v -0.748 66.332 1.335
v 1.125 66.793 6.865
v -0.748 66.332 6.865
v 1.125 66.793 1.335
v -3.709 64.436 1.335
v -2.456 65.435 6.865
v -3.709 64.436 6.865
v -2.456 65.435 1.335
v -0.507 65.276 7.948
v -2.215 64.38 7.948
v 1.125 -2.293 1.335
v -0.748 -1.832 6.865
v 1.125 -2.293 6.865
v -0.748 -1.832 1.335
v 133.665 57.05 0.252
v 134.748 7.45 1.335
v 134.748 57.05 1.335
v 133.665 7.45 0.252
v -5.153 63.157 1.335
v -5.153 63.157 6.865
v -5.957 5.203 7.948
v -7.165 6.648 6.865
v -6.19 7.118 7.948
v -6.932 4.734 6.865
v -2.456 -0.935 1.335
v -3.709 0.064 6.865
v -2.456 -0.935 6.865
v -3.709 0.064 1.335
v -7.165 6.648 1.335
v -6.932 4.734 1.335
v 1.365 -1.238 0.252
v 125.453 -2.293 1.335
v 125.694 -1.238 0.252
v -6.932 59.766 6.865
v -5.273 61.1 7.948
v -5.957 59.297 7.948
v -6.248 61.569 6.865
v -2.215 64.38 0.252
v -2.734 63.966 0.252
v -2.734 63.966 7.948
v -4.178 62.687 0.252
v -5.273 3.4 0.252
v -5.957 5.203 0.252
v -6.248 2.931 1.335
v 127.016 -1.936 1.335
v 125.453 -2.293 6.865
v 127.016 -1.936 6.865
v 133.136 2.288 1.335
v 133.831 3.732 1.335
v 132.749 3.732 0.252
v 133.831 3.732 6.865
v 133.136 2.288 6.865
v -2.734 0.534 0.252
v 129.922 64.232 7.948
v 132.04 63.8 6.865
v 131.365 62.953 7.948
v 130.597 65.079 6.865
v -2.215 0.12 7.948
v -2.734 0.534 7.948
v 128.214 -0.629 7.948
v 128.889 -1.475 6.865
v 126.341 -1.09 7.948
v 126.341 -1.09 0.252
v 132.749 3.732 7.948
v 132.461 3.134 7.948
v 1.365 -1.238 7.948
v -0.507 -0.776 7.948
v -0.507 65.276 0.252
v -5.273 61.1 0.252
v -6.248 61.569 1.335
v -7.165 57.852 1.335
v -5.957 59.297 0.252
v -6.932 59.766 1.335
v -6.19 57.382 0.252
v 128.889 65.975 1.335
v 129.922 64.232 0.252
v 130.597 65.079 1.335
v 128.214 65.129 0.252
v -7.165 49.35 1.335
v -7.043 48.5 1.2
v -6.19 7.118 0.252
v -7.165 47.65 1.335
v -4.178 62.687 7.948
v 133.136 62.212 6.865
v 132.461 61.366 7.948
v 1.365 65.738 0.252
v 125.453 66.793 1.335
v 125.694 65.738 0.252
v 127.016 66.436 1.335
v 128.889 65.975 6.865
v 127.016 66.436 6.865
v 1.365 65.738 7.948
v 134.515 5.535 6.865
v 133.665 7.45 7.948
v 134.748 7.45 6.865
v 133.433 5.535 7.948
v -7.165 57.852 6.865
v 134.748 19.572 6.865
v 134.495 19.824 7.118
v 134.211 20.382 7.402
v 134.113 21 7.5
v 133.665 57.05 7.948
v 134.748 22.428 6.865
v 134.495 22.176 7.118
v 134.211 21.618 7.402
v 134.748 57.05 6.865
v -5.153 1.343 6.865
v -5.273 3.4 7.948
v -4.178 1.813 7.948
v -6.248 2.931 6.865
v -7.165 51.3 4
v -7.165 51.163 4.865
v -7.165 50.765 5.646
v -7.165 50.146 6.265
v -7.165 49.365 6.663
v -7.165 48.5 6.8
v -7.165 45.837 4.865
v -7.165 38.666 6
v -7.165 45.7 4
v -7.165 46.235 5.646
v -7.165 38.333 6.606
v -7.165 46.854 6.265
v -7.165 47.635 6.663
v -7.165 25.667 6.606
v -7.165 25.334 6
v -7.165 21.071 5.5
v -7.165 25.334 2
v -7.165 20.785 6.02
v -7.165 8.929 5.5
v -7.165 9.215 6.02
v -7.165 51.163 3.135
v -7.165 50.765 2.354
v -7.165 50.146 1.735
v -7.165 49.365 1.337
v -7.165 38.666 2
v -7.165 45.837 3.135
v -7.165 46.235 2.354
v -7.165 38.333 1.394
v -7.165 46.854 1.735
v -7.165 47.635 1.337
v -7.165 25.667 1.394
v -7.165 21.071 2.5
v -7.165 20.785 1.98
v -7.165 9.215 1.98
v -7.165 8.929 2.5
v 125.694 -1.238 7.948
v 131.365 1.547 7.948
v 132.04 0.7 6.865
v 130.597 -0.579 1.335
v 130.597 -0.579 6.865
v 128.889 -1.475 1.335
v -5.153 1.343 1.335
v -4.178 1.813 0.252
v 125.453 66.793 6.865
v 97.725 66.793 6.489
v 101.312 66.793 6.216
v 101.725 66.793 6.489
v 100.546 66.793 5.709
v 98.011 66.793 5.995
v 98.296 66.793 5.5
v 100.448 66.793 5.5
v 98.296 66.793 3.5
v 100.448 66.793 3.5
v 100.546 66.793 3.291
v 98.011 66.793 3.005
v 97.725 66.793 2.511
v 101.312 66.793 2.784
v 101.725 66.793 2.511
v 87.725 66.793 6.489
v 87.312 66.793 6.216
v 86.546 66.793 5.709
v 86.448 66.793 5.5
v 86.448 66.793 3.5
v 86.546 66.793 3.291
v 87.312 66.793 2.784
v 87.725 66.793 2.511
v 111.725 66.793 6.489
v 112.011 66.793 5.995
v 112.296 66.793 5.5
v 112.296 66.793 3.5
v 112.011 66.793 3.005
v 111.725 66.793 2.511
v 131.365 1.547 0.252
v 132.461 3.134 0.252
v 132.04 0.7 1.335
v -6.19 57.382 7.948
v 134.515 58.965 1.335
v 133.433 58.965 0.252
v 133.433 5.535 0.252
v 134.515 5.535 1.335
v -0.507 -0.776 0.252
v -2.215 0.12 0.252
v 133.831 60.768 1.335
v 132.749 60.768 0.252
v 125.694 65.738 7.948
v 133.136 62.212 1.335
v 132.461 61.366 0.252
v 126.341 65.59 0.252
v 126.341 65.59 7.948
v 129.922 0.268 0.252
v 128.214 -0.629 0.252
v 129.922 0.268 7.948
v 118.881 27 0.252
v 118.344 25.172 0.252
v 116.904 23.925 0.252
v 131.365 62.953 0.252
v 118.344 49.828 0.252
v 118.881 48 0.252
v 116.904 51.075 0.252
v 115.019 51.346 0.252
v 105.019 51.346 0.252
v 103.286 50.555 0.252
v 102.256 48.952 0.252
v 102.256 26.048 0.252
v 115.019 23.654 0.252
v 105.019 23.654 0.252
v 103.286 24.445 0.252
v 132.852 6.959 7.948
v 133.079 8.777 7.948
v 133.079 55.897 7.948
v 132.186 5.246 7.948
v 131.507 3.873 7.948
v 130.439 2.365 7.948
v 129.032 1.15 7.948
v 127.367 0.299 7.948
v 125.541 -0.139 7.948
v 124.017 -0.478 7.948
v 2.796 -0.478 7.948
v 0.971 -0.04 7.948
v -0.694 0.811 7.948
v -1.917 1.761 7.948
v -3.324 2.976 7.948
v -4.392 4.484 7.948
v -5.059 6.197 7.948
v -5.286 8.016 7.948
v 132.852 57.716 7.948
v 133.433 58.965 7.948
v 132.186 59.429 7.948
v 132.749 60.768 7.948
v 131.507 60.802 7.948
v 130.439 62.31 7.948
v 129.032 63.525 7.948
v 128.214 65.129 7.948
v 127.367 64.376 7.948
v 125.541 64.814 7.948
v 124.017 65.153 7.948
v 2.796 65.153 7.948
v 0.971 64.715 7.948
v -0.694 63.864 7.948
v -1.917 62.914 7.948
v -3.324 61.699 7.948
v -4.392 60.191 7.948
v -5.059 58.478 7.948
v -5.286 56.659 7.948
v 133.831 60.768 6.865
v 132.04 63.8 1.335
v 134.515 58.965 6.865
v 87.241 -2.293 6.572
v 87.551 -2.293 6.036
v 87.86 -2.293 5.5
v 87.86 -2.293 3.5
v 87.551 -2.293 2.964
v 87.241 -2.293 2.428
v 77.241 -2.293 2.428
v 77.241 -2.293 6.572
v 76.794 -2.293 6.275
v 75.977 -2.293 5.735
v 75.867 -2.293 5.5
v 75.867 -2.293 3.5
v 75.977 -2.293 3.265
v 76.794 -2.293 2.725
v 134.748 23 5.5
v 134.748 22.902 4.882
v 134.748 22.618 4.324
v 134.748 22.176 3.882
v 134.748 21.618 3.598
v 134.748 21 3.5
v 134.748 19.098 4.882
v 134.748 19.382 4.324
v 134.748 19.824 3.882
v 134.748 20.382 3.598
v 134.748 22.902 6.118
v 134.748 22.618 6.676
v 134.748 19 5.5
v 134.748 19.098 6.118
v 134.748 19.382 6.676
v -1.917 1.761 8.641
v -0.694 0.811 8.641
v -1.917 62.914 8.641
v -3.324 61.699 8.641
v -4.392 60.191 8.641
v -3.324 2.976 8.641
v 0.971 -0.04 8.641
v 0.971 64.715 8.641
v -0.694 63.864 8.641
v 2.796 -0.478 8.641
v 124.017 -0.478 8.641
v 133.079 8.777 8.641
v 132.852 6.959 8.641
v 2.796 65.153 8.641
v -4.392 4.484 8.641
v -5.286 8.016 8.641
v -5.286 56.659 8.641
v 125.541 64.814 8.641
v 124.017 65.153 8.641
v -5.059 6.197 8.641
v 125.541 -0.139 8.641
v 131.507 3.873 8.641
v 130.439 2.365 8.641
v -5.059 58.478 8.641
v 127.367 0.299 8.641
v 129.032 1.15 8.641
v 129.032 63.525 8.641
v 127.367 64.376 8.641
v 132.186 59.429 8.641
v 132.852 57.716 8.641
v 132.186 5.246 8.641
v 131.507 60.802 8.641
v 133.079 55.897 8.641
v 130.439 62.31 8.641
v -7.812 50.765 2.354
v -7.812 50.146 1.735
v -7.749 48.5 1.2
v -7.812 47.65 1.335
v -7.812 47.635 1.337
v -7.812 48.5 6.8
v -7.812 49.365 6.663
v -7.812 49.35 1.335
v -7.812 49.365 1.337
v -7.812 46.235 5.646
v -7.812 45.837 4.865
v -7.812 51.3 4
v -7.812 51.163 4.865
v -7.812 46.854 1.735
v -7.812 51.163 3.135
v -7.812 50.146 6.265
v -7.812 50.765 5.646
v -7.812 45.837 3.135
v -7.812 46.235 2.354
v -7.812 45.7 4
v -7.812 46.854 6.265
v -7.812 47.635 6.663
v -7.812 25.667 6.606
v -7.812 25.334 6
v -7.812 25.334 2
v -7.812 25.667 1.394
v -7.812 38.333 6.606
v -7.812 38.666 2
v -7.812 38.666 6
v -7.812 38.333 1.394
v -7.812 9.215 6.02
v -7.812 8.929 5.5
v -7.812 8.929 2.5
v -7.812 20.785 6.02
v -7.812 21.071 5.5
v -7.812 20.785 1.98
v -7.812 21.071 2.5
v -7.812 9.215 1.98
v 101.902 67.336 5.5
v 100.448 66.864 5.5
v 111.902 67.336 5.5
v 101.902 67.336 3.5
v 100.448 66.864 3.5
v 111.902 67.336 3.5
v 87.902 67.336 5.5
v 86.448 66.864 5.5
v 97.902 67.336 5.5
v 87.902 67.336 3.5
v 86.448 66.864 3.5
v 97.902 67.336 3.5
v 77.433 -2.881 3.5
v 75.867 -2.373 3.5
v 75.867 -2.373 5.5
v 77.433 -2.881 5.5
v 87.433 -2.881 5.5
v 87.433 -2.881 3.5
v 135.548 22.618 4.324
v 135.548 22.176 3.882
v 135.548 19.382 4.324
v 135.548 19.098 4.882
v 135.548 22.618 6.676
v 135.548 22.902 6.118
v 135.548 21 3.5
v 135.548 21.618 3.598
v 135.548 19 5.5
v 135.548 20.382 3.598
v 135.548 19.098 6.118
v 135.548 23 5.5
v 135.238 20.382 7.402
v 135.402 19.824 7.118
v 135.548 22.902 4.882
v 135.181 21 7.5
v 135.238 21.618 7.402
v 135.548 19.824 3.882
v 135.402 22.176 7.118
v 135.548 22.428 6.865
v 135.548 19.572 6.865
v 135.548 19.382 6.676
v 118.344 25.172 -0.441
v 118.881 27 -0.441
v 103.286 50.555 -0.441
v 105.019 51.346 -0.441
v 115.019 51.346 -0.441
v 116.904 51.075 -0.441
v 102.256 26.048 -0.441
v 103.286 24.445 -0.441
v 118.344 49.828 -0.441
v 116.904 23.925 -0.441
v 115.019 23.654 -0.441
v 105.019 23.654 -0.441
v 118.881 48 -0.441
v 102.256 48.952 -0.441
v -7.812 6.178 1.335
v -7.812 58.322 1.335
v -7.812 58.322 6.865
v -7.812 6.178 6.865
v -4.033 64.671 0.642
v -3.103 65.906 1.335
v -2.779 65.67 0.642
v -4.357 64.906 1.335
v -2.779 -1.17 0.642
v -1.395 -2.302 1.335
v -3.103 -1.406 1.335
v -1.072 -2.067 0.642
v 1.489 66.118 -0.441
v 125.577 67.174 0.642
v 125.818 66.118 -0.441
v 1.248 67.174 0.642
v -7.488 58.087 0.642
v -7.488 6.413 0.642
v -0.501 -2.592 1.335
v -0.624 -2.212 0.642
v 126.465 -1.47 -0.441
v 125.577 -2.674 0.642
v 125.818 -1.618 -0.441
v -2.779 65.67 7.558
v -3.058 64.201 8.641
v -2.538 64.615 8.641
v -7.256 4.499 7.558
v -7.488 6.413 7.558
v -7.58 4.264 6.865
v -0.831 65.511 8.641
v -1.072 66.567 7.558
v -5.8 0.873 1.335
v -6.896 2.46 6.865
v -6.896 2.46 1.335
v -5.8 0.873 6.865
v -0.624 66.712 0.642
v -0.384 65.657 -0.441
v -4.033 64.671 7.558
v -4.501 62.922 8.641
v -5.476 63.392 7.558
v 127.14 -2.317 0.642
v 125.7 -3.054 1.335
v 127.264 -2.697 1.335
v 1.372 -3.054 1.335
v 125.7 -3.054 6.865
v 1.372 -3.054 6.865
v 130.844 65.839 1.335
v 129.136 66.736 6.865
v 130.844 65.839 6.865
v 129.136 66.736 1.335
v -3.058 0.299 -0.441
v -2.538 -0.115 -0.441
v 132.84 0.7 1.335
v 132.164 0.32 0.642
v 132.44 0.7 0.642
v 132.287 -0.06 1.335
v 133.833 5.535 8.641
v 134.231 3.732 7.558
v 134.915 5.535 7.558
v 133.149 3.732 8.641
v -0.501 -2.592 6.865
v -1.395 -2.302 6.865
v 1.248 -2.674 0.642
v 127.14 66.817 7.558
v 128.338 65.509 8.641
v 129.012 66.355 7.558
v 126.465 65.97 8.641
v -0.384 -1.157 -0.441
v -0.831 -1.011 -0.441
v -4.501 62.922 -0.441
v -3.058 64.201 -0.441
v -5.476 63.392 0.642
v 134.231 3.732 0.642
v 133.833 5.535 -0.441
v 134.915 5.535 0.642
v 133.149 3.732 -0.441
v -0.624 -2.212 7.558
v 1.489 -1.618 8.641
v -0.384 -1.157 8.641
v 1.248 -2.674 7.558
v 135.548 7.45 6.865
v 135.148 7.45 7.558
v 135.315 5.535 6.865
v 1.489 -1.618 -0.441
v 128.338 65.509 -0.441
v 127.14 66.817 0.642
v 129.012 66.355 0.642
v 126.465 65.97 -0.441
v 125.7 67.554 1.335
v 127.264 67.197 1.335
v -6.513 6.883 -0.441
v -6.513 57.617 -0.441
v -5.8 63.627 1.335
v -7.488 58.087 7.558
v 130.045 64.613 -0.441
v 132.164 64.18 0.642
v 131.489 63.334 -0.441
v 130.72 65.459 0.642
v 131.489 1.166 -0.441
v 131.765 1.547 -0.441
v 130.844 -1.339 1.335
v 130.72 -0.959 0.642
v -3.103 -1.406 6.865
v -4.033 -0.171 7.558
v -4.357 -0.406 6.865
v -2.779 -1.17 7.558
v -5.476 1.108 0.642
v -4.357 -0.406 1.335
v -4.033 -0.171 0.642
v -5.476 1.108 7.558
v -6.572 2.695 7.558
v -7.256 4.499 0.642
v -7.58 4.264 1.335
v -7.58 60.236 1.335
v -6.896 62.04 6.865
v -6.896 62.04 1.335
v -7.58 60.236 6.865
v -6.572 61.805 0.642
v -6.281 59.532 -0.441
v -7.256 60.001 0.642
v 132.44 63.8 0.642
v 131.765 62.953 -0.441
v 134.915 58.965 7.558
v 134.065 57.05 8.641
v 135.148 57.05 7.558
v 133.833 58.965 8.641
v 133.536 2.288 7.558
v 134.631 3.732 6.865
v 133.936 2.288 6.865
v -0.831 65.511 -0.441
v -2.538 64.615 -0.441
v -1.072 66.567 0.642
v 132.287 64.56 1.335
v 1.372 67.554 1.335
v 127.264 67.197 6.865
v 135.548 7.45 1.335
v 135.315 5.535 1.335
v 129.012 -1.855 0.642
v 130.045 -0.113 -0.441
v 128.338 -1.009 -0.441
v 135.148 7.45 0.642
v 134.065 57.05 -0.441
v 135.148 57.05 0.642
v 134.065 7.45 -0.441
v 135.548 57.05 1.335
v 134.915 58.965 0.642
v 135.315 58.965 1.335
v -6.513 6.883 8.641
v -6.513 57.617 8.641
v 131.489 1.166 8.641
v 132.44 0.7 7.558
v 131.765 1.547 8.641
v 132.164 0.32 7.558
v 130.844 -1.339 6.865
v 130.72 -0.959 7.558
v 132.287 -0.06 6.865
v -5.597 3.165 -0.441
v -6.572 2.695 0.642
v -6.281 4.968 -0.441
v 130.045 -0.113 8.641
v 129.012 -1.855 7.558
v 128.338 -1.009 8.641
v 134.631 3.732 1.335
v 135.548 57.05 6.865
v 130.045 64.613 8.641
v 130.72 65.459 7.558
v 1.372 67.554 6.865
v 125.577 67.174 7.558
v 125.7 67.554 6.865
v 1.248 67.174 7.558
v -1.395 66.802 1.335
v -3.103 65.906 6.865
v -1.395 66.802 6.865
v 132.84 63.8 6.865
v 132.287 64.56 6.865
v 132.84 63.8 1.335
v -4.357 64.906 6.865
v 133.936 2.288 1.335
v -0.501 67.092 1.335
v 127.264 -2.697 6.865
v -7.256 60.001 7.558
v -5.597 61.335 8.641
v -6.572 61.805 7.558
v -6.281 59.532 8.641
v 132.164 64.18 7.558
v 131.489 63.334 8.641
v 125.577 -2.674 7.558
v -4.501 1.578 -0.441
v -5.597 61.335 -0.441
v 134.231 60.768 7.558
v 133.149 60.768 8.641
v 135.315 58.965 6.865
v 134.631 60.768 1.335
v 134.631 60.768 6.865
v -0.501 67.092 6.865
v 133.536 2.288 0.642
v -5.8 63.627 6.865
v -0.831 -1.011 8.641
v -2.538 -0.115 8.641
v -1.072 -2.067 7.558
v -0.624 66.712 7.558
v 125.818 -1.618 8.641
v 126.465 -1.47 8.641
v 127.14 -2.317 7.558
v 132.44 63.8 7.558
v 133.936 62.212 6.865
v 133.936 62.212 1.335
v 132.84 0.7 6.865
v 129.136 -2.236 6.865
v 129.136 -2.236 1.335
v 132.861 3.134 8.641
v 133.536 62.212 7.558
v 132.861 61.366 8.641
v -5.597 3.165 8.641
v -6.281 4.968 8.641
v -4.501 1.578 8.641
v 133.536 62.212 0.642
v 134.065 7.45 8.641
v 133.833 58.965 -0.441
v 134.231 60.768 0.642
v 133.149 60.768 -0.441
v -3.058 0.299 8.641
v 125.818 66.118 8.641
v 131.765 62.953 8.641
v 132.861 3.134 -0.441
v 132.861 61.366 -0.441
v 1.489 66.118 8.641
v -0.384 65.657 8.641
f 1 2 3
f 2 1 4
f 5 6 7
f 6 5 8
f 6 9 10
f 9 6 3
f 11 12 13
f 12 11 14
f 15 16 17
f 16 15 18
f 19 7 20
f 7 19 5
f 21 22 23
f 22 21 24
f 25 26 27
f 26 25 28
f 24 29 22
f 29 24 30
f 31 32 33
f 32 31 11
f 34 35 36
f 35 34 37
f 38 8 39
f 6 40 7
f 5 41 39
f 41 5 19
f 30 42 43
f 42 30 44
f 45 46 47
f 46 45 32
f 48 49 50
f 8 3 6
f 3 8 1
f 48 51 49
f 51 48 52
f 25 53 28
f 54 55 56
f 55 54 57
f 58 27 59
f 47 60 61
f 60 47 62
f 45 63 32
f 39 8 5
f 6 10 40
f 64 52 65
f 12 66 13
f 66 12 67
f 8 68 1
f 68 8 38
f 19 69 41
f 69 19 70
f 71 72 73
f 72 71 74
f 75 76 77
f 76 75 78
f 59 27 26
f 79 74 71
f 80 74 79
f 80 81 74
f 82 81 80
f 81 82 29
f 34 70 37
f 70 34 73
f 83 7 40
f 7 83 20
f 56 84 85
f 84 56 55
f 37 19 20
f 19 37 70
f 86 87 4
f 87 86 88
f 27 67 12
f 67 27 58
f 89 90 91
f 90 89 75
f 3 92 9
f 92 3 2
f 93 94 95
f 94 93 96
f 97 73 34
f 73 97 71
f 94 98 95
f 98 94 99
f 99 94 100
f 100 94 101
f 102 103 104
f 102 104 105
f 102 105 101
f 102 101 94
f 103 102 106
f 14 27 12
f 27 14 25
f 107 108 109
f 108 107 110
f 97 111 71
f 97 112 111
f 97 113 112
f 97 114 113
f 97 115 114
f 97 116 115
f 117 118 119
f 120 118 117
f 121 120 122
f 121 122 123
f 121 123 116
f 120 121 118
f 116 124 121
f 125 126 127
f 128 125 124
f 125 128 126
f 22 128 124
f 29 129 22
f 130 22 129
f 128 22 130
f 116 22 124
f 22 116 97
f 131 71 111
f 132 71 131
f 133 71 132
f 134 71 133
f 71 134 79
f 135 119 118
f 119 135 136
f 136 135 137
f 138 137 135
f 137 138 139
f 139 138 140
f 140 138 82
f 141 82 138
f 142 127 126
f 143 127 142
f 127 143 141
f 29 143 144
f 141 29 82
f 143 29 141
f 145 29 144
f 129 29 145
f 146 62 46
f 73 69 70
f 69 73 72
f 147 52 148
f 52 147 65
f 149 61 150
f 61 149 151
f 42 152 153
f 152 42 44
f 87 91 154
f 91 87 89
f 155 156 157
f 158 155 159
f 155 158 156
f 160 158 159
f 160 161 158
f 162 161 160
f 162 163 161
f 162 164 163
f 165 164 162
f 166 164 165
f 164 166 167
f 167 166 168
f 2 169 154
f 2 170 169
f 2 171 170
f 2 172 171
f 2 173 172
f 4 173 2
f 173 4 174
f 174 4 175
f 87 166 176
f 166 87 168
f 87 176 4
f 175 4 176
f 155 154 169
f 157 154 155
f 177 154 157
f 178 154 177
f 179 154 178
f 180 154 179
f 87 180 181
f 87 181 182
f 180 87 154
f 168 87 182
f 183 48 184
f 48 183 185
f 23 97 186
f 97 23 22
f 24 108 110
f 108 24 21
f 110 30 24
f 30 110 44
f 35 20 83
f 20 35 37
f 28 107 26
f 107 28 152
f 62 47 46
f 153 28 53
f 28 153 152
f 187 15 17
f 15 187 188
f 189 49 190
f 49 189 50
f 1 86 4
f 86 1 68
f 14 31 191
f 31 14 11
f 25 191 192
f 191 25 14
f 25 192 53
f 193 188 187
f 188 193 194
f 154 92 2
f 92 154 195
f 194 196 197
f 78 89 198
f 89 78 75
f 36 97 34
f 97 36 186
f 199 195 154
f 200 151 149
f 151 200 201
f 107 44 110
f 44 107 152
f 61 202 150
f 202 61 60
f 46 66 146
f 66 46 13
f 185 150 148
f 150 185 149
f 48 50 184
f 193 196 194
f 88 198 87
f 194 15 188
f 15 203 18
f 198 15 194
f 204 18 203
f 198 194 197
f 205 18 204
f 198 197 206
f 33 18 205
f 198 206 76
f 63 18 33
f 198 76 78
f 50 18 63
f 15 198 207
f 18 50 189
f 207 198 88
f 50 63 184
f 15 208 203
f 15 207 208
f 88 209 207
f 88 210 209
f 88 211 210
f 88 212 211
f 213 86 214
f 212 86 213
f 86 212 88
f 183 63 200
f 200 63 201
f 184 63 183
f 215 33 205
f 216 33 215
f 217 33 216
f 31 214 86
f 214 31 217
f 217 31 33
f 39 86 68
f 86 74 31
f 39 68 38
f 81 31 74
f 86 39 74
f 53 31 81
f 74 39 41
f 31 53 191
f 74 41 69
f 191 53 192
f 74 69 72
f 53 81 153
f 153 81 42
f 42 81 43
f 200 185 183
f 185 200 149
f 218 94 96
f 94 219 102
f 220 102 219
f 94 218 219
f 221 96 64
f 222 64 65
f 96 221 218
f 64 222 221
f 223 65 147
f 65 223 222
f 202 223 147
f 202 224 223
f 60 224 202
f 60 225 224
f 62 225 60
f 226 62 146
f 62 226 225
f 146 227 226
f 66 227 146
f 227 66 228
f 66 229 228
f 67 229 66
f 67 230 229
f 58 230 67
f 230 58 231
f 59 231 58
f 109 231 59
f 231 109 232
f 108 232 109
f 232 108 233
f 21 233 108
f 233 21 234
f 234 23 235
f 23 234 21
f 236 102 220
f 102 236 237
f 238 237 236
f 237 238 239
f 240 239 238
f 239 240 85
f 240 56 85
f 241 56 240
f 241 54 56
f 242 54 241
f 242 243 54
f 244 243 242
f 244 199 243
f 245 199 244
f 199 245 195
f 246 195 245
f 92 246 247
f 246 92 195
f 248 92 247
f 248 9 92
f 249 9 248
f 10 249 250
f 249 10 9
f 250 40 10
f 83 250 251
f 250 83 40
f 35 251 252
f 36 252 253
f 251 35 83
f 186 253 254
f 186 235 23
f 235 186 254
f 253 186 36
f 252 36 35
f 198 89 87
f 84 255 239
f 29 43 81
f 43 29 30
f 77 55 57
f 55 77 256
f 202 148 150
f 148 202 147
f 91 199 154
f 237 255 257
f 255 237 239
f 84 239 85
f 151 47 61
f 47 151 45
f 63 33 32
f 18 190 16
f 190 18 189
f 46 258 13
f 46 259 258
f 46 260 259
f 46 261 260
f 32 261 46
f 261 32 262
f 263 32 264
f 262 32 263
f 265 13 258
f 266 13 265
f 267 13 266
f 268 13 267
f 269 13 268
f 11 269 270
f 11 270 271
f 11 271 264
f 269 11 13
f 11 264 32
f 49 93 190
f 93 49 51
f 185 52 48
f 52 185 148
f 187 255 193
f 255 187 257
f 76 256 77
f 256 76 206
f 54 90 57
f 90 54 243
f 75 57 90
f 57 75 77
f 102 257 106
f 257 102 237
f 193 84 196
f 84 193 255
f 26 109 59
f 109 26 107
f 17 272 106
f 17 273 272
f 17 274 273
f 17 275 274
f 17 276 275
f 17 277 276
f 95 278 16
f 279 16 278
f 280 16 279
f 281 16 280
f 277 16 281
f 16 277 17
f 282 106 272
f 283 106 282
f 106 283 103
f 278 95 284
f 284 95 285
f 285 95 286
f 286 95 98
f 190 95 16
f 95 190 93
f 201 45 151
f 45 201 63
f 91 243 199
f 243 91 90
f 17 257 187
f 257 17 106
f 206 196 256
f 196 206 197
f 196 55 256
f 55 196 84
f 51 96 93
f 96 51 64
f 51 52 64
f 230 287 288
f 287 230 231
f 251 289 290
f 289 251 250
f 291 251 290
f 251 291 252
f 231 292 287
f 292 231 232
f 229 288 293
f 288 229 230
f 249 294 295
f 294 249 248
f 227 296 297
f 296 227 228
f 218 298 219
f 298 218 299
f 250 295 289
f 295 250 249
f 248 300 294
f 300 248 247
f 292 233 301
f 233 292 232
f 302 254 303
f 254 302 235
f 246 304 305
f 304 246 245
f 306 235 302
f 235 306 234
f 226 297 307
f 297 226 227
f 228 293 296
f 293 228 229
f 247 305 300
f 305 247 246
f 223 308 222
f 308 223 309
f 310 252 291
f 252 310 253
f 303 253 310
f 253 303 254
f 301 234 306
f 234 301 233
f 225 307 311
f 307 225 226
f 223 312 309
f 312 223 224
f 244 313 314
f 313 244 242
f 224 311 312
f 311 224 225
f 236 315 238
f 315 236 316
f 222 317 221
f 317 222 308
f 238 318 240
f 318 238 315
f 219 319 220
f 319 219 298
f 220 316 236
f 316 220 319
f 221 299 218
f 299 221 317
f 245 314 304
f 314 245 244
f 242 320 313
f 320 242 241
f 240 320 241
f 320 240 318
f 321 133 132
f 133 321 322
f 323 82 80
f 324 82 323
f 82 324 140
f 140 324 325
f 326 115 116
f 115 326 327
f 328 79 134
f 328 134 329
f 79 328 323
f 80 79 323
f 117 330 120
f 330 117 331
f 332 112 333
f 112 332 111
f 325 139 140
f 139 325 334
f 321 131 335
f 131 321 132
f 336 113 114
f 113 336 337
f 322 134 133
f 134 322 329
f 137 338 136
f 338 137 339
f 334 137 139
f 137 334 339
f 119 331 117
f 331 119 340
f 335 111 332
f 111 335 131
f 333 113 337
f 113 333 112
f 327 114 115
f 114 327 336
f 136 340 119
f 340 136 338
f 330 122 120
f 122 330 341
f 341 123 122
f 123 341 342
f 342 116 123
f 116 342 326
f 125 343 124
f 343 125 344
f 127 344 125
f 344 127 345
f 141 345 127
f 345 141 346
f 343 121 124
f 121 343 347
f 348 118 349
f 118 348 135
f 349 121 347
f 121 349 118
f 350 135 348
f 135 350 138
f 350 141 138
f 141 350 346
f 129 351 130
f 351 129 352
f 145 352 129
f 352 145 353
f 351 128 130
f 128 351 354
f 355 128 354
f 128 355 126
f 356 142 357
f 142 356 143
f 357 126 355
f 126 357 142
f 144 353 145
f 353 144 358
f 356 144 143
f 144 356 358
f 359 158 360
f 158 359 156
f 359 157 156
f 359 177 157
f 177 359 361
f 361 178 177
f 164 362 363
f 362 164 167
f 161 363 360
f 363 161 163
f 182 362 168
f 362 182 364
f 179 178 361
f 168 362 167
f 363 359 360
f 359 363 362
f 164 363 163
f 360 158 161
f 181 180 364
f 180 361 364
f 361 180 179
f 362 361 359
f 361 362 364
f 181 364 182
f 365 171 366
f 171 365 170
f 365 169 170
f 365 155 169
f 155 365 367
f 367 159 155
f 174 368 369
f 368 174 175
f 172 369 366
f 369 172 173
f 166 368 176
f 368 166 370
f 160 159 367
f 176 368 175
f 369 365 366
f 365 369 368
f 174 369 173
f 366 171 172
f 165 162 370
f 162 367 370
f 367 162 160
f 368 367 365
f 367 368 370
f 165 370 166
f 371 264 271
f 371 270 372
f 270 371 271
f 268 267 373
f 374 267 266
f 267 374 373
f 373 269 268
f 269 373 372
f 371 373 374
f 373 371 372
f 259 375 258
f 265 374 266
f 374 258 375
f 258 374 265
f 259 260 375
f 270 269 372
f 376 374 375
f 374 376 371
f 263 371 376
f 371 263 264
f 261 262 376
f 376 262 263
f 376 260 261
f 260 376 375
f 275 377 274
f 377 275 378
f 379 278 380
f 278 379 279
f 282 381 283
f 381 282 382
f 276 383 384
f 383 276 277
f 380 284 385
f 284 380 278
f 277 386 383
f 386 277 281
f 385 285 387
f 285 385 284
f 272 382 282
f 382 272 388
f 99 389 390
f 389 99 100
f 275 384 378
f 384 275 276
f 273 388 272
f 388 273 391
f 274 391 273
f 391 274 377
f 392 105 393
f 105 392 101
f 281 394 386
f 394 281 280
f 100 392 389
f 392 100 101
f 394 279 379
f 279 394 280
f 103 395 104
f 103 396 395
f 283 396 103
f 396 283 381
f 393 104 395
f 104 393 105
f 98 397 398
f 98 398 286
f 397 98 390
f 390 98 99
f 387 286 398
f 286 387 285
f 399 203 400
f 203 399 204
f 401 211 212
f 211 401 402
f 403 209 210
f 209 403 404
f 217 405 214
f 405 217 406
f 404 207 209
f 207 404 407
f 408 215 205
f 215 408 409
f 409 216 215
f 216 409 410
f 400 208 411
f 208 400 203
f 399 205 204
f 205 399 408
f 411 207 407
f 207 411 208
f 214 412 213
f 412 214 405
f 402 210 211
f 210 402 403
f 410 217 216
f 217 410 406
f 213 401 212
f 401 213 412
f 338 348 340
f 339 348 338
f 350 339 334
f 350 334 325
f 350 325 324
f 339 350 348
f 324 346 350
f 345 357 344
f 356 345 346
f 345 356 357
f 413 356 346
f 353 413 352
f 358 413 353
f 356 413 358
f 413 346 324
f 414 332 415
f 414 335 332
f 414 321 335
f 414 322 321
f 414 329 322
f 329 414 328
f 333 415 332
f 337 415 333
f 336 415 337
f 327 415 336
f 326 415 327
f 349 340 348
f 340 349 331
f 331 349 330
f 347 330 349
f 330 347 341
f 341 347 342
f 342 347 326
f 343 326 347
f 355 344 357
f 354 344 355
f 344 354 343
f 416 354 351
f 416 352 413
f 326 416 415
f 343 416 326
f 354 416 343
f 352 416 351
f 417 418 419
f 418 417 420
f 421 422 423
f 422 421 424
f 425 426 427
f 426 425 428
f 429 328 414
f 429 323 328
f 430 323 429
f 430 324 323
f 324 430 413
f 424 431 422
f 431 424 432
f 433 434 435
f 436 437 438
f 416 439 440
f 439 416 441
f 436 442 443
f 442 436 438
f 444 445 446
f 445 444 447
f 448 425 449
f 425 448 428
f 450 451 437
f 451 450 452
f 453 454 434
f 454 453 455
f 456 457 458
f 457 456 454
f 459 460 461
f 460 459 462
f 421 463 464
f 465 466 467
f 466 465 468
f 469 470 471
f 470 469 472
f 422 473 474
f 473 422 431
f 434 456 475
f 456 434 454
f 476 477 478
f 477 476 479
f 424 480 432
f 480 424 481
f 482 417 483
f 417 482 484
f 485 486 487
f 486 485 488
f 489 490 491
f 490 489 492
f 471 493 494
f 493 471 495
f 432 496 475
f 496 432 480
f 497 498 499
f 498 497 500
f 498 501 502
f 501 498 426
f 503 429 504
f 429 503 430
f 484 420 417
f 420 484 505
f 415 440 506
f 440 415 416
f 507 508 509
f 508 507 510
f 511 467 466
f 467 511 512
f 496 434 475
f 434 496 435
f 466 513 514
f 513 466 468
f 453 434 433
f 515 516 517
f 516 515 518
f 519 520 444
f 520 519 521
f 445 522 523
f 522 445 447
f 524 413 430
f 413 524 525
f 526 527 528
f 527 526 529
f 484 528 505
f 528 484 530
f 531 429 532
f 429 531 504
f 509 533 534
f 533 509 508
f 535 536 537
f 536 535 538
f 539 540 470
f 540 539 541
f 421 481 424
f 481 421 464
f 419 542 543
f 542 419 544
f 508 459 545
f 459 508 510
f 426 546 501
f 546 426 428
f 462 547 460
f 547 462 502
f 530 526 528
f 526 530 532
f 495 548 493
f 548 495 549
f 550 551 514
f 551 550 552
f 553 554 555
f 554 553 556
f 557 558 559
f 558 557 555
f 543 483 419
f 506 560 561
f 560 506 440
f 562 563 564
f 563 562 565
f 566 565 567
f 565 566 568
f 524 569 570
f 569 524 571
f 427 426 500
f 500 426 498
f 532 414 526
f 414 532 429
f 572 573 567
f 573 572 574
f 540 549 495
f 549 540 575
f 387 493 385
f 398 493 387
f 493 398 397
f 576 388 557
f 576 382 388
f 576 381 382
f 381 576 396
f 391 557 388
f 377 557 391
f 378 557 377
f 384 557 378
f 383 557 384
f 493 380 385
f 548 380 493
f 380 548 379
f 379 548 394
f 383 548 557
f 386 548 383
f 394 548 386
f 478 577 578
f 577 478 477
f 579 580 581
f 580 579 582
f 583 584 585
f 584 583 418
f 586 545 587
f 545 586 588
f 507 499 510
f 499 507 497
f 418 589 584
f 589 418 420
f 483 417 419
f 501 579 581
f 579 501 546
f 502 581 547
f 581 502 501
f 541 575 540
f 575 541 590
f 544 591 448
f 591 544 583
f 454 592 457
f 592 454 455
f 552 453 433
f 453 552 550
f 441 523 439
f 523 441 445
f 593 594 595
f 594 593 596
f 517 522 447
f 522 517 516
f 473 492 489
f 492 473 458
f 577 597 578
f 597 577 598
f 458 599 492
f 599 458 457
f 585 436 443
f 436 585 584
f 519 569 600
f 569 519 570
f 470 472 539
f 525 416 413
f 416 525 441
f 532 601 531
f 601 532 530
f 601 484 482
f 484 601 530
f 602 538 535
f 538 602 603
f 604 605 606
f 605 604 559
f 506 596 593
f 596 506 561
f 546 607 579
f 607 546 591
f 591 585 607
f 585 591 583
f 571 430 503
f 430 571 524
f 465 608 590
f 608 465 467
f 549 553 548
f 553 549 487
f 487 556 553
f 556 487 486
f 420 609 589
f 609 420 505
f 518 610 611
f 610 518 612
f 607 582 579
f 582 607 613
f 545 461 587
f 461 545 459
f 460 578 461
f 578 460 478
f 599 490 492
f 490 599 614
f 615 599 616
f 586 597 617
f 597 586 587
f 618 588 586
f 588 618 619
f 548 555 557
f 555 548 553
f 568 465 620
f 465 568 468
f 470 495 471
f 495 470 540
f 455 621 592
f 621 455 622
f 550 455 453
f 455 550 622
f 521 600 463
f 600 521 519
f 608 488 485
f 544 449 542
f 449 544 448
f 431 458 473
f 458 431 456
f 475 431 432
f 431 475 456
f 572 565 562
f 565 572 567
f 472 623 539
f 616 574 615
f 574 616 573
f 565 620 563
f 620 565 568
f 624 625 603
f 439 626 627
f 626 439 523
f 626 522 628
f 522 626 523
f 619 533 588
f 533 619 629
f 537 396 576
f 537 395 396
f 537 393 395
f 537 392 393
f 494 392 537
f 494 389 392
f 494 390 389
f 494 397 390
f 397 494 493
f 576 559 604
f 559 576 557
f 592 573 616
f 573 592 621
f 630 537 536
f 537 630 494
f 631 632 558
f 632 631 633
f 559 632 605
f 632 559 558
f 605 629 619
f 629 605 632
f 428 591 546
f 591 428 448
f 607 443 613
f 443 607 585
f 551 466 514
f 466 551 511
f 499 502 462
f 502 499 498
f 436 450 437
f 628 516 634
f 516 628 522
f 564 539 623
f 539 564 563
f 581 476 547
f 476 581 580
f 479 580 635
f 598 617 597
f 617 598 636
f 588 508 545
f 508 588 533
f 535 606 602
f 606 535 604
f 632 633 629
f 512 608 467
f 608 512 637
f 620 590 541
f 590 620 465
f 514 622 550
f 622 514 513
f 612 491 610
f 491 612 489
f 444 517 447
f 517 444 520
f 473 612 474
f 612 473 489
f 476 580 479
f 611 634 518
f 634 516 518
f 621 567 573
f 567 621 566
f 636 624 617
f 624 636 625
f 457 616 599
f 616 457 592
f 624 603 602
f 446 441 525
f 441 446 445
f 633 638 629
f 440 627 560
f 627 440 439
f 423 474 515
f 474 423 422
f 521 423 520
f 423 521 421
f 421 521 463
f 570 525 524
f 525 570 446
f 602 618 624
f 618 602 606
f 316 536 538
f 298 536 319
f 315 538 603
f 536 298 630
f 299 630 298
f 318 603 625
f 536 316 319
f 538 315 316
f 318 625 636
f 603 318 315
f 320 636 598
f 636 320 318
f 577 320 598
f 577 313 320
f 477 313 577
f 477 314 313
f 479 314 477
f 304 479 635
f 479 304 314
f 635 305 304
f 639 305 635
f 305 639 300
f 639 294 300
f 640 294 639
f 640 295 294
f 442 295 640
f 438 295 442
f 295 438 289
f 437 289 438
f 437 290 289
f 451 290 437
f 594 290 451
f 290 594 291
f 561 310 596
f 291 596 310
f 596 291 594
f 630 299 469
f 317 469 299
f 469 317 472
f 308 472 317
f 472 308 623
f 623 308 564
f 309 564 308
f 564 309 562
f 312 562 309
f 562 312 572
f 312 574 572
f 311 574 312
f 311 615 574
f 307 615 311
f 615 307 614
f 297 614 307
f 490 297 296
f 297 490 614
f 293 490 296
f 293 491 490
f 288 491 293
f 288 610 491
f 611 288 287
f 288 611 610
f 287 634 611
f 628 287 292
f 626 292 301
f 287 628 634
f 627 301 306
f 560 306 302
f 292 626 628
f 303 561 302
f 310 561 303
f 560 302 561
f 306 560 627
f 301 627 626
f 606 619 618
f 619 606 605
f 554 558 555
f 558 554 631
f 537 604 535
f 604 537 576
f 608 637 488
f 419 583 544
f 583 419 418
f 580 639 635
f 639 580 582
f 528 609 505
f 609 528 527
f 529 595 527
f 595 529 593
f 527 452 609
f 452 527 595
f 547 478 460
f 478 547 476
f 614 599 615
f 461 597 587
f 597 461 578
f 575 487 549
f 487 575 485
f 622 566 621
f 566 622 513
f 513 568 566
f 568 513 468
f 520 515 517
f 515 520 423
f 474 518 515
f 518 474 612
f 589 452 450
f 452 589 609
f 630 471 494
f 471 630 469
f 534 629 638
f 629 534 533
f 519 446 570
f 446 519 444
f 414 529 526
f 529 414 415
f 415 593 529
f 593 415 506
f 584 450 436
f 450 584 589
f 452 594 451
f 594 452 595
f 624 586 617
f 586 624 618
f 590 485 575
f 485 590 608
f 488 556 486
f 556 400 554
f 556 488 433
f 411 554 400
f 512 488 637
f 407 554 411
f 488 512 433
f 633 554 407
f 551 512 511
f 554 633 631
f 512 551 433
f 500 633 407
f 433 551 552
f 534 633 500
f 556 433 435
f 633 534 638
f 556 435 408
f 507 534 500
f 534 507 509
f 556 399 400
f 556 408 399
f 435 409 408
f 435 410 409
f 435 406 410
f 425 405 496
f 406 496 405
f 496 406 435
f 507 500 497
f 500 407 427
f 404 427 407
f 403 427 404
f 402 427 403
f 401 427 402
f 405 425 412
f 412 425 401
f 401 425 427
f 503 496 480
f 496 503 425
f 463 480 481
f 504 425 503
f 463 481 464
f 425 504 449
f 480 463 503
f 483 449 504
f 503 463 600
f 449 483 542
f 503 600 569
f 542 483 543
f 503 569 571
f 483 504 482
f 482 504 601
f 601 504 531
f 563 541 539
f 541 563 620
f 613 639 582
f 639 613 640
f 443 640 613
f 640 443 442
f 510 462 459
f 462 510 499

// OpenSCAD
$bottom=45;
$rotation=-90;
$text1size=10;
$text1="";
$linespace=-20;
$text2size=10;
$text2 ="";

module samsung() {
    minkowski() {
        translate([2.5,7.45,2.1]) cube([122.4,49.6,3.5]);
        translate([0,0,0]) cylinder(r=8, h=.5);
        sphere(r=2);
    }
}
module  slogan() {
    translate([$bottom,32,1])
    rotate (a=[0,180,-$rotation]) 
    linear_extrude(3) union() {
        text($text1, halign="center", size=$text1size);
        translate([0,$linespace,0])
            text($text2, halign="center", size=$text2size, font="verdana" );
    }
}

difference() {
    union() {
        //case
        color("green") minkowski() {
            samsung();
            sphere(r=0.8);
        }
//        //volume buttons
//        translate([106.5,65,4.5]) color("blue") minkowski() {
//            cube([10,5,1], center=true);
//            sphere(r=1);
//        }   
//        translate([92.5,65,4.5]) color("blue") minkowski() {
//            cube([10,5,1], center=true);
//            sphere(r=1);
//        }   
//        //power button
//        translate([82,-.6,4.5]) color("blue") minkowski() {
//            cube([10,5,1], center=true);
//            sphere(r=1);
//        }   
    }
    slogan();
    union() {
        // inside
        samsung();
        // screen opening
        translate([1.7,1.7,5]) scale([.975,.95,1]) samsung();
        // headphone opening
        rotate([0,90,0]) translate([-4,48.5,0]) cylinder(r=2.8,h=20,$fn=20, center=true);
        // buttom openings
        translate([-10,32,4]) color("red") minkowski() {
            cube([10,12,4], center=true);
            sphere(r=0.7);
        }
        translate([-10,15,4]) color("red") minkowski() {
            cube([7,11,3], center=true);
            sphere(r=0.6);
        }
        // volume buttons inner
        translate([106.5,63.6,4.5]) color("blue") minkowski() {
            cube([10,5,2], center=true);
            sphere(r=1.3);
        }   
        translate([92.5,63.6,4.5]) color("blue") minkowski() {
            cube([10,5,2], center=true);
            sphere(r=1.3);
        }   

        // power button inner
        translate([82,.95,4.5]) color("blue") minkowski() {
            cube([10,5,2], center=true);
            sphere(r=1.4);
        }   

        // top mic opening
        rotate([0,90,0]) translate([-5.5,21,135]) cylinder(r=2,h=20,$fn=20, center=true);    
        // camera opening
        translate([110.5,37.5,-5]) color("yellow") minkowski() {
            cube([10,21,10], center=true);
            sphere(r=3.5);
        }
    }   
}
